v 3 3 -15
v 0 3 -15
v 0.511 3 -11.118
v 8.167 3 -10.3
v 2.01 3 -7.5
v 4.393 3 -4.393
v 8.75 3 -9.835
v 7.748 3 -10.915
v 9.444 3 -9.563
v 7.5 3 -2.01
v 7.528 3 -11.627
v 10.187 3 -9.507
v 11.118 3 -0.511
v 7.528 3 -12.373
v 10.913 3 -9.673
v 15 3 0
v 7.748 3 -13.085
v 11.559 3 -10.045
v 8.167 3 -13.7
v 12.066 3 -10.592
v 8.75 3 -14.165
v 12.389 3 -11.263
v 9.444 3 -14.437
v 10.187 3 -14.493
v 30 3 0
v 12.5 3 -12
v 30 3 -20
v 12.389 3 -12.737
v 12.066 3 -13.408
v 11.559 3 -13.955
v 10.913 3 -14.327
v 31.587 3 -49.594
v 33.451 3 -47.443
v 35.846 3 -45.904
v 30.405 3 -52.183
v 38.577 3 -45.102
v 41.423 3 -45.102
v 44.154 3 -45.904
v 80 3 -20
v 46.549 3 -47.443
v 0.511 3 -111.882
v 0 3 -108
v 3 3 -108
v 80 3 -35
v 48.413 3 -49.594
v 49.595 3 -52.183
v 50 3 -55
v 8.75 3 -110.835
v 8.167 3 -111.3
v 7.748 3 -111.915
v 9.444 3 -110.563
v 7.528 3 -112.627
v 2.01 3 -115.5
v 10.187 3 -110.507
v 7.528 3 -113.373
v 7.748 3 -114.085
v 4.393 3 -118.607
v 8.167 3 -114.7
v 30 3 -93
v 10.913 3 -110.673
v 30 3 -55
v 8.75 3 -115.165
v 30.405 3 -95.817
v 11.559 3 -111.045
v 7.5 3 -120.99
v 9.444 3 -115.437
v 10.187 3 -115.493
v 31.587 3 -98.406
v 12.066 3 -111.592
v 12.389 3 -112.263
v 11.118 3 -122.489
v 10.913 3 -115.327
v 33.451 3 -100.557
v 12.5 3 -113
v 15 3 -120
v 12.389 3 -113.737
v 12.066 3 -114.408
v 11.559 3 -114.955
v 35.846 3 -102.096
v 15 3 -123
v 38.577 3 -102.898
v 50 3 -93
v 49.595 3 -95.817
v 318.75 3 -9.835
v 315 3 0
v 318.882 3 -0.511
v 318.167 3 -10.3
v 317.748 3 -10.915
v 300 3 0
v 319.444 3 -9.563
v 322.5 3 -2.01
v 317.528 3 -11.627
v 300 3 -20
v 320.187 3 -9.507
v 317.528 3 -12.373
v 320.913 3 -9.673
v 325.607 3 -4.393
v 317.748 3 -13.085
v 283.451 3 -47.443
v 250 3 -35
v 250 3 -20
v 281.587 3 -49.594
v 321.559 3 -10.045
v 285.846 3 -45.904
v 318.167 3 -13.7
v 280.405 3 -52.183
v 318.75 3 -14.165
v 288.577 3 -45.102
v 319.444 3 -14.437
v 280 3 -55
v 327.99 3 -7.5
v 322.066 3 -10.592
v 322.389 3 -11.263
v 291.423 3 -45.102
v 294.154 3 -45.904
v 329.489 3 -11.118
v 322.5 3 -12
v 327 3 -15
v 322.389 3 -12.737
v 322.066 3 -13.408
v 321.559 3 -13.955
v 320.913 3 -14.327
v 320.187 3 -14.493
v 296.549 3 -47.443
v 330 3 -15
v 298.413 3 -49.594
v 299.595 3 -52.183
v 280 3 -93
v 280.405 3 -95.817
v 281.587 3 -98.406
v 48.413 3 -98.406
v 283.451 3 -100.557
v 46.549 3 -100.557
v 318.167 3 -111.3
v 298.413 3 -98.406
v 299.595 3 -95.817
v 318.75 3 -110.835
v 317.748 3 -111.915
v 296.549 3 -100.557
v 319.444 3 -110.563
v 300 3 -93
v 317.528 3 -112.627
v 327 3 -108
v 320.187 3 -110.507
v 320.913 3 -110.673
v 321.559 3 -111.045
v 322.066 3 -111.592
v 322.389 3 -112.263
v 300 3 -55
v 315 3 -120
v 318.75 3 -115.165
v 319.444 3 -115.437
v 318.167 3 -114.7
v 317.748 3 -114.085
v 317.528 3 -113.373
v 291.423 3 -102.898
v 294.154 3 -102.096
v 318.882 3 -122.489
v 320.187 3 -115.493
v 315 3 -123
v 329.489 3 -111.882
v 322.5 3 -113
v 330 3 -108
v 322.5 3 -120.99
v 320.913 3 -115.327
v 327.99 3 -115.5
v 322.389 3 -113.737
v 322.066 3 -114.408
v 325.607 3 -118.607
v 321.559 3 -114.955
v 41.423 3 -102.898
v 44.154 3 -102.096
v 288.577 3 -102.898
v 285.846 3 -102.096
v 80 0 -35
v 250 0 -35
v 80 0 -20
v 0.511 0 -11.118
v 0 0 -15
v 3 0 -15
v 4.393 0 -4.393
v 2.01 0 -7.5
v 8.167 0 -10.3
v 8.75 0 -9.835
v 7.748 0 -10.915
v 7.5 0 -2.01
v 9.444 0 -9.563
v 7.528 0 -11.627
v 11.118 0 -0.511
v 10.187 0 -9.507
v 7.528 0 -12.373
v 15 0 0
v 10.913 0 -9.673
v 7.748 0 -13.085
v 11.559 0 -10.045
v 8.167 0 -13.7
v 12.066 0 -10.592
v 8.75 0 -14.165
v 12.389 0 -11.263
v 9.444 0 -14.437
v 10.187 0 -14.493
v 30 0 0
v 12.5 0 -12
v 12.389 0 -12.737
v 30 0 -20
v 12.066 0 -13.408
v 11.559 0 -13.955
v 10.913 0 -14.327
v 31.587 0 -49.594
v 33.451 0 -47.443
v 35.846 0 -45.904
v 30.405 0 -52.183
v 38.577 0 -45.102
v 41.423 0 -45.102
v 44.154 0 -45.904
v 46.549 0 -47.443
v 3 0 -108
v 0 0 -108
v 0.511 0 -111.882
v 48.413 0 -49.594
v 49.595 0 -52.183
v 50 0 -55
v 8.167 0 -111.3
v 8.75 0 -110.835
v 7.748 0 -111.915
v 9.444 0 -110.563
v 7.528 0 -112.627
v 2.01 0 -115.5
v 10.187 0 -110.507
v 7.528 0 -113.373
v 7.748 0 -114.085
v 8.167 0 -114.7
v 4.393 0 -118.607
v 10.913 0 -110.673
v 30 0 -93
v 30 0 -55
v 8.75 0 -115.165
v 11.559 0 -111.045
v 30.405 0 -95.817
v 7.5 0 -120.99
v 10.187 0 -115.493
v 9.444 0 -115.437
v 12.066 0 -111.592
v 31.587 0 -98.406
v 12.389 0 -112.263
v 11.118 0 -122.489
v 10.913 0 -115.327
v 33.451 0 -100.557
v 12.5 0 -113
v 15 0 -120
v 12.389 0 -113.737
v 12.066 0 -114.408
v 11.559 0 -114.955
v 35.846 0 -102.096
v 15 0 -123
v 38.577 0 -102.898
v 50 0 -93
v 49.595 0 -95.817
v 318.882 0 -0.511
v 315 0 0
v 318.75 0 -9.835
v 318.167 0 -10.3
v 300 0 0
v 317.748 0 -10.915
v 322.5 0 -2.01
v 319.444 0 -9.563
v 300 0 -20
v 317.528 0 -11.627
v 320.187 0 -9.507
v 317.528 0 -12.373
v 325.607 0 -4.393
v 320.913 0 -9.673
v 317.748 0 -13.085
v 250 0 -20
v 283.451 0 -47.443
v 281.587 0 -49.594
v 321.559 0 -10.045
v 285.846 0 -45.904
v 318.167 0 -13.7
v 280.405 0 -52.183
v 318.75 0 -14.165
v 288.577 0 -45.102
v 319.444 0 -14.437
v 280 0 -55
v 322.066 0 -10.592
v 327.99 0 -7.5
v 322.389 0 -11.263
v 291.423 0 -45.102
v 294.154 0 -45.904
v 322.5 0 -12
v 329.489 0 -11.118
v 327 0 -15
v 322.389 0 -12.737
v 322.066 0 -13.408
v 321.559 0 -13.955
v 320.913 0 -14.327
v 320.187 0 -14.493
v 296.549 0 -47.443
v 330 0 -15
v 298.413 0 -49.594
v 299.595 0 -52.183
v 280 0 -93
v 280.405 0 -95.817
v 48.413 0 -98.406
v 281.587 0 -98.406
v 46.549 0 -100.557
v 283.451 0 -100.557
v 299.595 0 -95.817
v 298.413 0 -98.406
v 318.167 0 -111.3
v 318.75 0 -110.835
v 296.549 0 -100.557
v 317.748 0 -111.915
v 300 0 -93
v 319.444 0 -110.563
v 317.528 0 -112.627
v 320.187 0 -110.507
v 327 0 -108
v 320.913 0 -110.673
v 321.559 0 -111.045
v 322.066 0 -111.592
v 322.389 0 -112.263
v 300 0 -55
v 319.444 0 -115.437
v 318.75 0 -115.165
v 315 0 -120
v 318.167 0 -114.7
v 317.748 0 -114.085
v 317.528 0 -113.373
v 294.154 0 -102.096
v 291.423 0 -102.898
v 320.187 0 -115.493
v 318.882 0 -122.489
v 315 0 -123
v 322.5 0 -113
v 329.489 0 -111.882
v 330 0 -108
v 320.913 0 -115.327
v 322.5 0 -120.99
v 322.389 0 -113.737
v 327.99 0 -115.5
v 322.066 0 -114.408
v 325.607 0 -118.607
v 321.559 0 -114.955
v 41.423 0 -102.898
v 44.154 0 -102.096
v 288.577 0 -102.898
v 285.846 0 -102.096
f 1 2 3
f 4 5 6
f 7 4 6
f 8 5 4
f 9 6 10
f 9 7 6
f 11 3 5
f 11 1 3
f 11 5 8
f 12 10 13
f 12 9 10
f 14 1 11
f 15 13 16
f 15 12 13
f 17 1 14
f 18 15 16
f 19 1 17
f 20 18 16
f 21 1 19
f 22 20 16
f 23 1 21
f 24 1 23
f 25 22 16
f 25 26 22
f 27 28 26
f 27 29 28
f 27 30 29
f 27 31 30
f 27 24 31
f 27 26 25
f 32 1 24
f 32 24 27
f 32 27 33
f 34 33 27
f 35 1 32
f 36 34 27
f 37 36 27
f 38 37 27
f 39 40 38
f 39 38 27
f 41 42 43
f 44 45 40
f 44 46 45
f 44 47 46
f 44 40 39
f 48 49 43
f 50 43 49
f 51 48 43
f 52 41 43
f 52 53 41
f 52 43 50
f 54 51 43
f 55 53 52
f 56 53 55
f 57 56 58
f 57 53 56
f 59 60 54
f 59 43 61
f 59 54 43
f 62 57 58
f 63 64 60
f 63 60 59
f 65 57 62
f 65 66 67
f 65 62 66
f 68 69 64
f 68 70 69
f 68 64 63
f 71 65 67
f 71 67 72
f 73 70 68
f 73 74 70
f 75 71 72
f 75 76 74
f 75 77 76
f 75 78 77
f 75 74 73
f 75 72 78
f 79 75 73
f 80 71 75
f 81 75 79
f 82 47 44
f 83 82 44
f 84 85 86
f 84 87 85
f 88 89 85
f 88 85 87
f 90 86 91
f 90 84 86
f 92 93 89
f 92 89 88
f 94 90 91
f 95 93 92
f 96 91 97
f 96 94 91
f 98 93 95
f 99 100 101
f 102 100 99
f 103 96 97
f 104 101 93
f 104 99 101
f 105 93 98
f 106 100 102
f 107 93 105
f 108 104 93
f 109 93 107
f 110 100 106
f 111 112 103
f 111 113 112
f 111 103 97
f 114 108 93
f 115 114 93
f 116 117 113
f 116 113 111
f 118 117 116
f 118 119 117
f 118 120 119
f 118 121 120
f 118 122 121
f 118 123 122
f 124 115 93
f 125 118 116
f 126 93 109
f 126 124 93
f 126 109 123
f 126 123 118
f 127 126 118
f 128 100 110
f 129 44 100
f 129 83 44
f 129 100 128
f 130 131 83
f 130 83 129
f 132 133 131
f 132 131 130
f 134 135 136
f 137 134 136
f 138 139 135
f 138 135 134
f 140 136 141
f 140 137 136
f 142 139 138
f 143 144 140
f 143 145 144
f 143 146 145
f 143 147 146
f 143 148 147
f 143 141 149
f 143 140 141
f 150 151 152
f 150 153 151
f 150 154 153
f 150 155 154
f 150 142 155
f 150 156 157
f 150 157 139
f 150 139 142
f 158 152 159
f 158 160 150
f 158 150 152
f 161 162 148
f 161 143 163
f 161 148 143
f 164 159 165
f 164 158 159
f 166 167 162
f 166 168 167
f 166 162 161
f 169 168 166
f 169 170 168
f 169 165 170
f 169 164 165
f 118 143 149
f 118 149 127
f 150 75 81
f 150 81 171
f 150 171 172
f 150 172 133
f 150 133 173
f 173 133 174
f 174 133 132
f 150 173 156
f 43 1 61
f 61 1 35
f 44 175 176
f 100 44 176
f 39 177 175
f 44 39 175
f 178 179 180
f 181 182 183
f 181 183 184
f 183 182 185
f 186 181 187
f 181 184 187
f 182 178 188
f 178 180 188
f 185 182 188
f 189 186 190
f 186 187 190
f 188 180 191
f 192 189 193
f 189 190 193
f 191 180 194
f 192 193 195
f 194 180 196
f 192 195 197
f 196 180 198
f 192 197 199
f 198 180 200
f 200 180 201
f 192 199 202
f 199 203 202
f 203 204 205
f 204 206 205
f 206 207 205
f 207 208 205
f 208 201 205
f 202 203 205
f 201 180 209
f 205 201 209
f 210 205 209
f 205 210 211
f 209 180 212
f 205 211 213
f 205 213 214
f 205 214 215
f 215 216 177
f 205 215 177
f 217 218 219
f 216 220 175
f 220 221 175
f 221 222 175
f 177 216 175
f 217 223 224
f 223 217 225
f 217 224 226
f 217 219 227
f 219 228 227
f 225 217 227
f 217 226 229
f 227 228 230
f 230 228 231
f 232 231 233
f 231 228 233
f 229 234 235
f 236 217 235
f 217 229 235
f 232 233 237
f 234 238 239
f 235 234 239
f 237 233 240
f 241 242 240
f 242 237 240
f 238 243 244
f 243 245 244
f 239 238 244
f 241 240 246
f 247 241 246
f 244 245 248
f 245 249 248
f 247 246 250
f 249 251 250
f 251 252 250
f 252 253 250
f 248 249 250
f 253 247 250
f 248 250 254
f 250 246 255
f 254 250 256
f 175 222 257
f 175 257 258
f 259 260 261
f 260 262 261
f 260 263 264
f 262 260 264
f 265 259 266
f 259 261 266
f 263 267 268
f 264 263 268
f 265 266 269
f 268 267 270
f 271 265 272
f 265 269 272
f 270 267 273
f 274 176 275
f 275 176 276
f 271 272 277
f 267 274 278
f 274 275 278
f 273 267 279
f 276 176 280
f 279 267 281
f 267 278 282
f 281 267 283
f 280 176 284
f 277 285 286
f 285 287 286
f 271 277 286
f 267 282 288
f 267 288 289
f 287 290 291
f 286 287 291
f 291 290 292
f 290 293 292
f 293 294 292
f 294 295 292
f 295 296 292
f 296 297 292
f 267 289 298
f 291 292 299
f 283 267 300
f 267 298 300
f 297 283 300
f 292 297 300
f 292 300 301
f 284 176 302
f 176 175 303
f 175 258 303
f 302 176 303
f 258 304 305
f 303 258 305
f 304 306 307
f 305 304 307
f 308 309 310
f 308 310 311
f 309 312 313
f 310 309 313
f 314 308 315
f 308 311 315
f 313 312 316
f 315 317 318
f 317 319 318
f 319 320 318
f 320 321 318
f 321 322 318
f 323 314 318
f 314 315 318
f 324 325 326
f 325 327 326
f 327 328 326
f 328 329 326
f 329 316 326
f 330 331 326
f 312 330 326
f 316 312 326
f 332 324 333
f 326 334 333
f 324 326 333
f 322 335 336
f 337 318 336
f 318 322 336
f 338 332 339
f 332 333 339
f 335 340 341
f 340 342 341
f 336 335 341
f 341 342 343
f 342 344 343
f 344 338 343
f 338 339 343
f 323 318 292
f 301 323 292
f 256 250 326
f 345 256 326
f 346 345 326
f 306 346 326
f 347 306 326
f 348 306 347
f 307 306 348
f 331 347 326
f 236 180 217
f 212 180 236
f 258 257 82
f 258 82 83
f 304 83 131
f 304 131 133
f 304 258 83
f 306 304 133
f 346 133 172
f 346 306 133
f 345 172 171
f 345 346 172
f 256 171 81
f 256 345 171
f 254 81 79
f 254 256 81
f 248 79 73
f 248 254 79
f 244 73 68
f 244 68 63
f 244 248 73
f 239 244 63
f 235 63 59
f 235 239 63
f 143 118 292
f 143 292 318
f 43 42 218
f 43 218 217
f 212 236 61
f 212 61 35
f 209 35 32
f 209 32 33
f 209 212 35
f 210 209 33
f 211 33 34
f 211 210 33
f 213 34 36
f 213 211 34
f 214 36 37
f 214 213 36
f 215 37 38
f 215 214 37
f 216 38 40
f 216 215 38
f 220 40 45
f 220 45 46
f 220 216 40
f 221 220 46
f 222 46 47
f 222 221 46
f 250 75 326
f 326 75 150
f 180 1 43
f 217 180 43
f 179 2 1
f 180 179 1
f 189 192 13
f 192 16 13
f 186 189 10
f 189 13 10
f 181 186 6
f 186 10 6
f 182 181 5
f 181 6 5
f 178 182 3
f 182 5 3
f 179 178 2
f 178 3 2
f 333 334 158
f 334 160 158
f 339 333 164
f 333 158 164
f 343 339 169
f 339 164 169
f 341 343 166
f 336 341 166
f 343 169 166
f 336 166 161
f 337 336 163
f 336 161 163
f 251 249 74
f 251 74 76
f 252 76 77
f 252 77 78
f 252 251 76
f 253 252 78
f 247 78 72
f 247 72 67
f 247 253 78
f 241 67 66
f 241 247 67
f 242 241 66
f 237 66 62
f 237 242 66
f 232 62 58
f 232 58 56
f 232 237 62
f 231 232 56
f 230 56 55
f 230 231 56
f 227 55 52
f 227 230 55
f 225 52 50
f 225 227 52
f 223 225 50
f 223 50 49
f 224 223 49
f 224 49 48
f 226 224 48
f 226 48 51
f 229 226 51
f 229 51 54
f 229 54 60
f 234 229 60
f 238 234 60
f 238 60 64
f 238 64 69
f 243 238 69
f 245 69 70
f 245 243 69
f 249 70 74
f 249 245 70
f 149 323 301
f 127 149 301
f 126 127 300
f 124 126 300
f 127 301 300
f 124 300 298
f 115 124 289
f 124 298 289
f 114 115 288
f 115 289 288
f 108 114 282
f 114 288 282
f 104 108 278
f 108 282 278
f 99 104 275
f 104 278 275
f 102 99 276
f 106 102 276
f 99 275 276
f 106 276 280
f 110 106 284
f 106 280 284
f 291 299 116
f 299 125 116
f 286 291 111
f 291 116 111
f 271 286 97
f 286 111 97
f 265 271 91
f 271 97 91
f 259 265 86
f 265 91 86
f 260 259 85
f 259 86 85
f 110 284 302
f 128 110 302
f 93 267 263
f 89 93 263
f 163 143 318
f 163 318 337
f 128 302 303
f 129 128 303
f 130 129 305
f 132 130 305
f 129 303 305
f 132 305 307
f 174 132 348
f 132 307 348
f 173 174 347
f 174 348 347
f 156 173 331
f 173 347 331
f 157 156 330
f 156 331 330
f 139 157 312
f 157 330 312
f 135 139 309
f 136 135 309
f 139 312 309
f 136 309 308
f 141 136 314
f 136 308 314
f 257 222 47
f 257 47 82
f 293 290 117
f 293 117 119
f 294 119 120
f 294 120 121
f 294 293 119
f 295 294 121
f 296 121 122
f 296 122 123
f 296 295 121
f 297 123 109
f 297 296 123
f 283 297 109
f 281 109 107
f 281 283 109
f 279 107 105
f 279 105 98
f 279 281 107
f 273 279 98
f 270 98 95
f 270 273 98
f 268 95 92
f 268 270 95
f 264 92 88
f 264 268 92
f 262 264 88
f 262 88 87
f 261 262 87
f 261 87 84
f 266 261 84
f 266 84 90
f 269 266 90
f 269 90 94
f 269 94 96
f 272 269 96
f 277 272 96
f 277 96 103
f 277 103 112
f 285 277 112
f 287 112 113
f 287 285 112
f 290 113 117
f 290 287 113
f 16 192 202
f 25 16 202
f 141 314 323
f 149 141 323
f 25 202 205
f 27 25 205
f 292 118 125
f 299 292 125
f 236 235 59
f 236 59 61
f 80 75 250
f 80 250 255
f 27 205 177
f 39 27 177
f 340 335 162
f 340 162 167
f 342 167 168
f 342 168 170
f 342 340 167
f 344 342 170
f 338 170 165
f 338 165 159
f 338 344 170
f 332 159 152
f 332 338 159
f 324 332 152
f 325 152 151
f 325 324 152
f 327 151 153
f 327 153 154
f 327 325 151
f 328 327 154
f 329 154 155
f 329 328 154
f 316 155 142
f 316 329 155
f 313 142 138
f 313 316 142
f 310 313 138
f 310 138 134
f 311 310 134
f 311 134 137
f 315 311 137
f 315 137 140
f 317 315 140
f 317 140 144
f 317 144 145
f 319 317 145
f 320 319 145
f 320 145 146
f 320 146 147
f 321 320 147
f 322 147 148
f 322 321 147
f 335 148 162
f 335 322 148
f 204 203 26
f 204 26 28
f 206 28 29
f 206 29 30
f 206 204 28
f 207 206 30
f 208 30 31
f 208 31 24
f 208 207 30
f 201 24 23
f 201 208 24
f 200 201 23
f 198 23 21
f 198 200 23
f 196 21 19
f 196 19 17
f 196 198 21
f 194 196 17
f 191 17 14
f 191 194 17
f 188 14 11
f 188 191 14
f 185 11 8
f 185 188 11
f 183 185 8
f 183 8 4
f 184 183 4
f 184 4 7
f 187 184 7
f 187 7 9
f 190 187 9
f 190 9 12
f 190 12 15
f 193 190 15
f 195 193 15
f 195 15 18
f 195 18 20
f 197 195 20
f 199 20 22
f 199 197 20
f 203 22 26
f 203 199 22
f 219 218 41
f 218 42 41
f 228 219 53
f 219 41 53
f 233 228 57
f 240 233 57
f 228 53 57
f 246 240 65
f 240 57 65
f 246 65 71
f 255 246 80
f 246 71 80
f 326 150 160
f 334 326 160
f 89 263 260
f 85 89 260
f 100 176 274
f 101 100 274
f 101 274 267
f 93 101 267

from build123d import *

# Parameters (mm, degrees)
ESQUISSE1_R      = 2.5
EXTRUSION1_DEPTH = 3
CONG_1_R         = 15
EXTRUSION2_REACH = 5
ESQUISSE2_W      = 3
ESQUISSE2_H      = 93
ESQUISSE2_W_2    = 300
ESQUISSE2_H_2    = 3


with BuildPart() as part:
    # Esquisse1 → Extrusion1 (new body)
    with BuildSketch(Plane(origin=(0, 0, 0), x_dir=(1, 0, 0), z_dir=(0, 1, 0))):
        Polygon((0, 0), (30, 0), (30, 20), (80, 20), (80, 35), (250, 35), (250, 20), (300, 20), (300, 0), (330, 0), (330, 123), (0, 123), align=None)
        with Locations((10, 113)):
            Circle(ESQUISSE1_R, mode=Mode.SUBTRACT)
        with Locations((320, 113)):
            Circle(ESQUISSE1_R, mode=Mode.SUBTRACT)
        with Locations((10, 12)):
            Circle(ESQUISSE1_R, mode=Mode.SUBTRACT)
        with Locations((320, 12)):
            Circle(ESQUISSE1_R, mode=Mode.SUBTRACT)
        with BuildLine():
            Line((300, 93), (300, 55))
            ThreePointArc((300, 55), (290, 45), (280, 55))
            Line((280, 55), (280, 93))
            ThreePointArc((280, 93), (290, 103), (300, 93))
        make_face(mode=Mode.SUBTRACT)
        with BuildLine():
            Line((30, 93), (30, 55))
            ThreePointArc((30, 55), (40, 45), (50, 55))
            Line((50, 55), (50, 93))
            ThreePointArc((50, 93), (40, 103), (30, 93))
        make_face(mode=Mode.SUBTRACT)
    extrude(amount=EXTRUSION1_DEPTH)

    # Congé1
    cong_1_edges = [part.edges().sort_by_distance(p)[0] for p in [
        (0, 1.5, -123),
        (330, 1.5, -123),
        (330, 1.5, 0),
        (0, 1.5, 0),
    ]]
    fillet(cong_1_edges, radius=CONG_1_R)

    # Esquisse2 → Extrusion2 (cut, up to next)
    with BuildSketch(Plane(origin=(0, 3, 0), x_dir=(1, 0, 0), z_dir=(0, 1, 0)), mode=Mode.PRIVATE) as extrusion2_sk1:
        with Locations((1.5, 61.5)):
            Rectangle(ESQUISSE2_W, ESQUISSE2_H)
    extrusion2_tool1 = extrude(extrusion2_sk1.sketch, amount=-EXTRUSION2_REACH, mode=Mode.PRIVATE) & part.part
    add(extrusion2_tool1.solids().sort_by_distance((1.5, 3, -61.5))[0], mode=Mode.SUBTRACT)
    # Esquisse2 → Extrusion2 (cut, up to next)
    with BuildSketch(Plane(origin=(0, 3, 0), x_dir=(1, 0, 0), z_dir=(0, 1, 0)), mode=Mode.PRIVATE) as extrusion2_sk2:
        with Locations((165, 121.5)):
            Rectangle(ESQUISSE2_W_2, ESQUISSE2_H_2)
    extrusion2_tool2 = extrude(extrusion2_sk2.sketch, amount=-EXTRUSION2_REACH, mode=Mode.PRIVATE) & part.part
    add(extrusion2_tool2.solids().sort_by_distance((165, 3, -121.5))[0], mode=Mode.SUBTRACT)
    # Esquisse2 → Extrusion2 (cut, up to next)
    with BuildSketch(Plane(origin=(0, 3, 0), x_dir=(1, 0, 0), z_dir=(0, 1, 0)), mode=Mode.PRIVATE) as extrusion2_sk3:
        with Locations((328.5, 61.5)):
            Rectangle(ESQUISSE2_W, ESQUISSE2_H)
    extrusion2_tool3 = extrude(extrusion2_sk3.sketch, amount=-EXTRUSION2_REACH, mode=Mode.PRIVATE) & part.part
    add(extrusion2_tool3.solids().sort_by_distance((328.5, 3, -61.5))[0], mode=Mode.SUBTRACT)


solid = part.part
